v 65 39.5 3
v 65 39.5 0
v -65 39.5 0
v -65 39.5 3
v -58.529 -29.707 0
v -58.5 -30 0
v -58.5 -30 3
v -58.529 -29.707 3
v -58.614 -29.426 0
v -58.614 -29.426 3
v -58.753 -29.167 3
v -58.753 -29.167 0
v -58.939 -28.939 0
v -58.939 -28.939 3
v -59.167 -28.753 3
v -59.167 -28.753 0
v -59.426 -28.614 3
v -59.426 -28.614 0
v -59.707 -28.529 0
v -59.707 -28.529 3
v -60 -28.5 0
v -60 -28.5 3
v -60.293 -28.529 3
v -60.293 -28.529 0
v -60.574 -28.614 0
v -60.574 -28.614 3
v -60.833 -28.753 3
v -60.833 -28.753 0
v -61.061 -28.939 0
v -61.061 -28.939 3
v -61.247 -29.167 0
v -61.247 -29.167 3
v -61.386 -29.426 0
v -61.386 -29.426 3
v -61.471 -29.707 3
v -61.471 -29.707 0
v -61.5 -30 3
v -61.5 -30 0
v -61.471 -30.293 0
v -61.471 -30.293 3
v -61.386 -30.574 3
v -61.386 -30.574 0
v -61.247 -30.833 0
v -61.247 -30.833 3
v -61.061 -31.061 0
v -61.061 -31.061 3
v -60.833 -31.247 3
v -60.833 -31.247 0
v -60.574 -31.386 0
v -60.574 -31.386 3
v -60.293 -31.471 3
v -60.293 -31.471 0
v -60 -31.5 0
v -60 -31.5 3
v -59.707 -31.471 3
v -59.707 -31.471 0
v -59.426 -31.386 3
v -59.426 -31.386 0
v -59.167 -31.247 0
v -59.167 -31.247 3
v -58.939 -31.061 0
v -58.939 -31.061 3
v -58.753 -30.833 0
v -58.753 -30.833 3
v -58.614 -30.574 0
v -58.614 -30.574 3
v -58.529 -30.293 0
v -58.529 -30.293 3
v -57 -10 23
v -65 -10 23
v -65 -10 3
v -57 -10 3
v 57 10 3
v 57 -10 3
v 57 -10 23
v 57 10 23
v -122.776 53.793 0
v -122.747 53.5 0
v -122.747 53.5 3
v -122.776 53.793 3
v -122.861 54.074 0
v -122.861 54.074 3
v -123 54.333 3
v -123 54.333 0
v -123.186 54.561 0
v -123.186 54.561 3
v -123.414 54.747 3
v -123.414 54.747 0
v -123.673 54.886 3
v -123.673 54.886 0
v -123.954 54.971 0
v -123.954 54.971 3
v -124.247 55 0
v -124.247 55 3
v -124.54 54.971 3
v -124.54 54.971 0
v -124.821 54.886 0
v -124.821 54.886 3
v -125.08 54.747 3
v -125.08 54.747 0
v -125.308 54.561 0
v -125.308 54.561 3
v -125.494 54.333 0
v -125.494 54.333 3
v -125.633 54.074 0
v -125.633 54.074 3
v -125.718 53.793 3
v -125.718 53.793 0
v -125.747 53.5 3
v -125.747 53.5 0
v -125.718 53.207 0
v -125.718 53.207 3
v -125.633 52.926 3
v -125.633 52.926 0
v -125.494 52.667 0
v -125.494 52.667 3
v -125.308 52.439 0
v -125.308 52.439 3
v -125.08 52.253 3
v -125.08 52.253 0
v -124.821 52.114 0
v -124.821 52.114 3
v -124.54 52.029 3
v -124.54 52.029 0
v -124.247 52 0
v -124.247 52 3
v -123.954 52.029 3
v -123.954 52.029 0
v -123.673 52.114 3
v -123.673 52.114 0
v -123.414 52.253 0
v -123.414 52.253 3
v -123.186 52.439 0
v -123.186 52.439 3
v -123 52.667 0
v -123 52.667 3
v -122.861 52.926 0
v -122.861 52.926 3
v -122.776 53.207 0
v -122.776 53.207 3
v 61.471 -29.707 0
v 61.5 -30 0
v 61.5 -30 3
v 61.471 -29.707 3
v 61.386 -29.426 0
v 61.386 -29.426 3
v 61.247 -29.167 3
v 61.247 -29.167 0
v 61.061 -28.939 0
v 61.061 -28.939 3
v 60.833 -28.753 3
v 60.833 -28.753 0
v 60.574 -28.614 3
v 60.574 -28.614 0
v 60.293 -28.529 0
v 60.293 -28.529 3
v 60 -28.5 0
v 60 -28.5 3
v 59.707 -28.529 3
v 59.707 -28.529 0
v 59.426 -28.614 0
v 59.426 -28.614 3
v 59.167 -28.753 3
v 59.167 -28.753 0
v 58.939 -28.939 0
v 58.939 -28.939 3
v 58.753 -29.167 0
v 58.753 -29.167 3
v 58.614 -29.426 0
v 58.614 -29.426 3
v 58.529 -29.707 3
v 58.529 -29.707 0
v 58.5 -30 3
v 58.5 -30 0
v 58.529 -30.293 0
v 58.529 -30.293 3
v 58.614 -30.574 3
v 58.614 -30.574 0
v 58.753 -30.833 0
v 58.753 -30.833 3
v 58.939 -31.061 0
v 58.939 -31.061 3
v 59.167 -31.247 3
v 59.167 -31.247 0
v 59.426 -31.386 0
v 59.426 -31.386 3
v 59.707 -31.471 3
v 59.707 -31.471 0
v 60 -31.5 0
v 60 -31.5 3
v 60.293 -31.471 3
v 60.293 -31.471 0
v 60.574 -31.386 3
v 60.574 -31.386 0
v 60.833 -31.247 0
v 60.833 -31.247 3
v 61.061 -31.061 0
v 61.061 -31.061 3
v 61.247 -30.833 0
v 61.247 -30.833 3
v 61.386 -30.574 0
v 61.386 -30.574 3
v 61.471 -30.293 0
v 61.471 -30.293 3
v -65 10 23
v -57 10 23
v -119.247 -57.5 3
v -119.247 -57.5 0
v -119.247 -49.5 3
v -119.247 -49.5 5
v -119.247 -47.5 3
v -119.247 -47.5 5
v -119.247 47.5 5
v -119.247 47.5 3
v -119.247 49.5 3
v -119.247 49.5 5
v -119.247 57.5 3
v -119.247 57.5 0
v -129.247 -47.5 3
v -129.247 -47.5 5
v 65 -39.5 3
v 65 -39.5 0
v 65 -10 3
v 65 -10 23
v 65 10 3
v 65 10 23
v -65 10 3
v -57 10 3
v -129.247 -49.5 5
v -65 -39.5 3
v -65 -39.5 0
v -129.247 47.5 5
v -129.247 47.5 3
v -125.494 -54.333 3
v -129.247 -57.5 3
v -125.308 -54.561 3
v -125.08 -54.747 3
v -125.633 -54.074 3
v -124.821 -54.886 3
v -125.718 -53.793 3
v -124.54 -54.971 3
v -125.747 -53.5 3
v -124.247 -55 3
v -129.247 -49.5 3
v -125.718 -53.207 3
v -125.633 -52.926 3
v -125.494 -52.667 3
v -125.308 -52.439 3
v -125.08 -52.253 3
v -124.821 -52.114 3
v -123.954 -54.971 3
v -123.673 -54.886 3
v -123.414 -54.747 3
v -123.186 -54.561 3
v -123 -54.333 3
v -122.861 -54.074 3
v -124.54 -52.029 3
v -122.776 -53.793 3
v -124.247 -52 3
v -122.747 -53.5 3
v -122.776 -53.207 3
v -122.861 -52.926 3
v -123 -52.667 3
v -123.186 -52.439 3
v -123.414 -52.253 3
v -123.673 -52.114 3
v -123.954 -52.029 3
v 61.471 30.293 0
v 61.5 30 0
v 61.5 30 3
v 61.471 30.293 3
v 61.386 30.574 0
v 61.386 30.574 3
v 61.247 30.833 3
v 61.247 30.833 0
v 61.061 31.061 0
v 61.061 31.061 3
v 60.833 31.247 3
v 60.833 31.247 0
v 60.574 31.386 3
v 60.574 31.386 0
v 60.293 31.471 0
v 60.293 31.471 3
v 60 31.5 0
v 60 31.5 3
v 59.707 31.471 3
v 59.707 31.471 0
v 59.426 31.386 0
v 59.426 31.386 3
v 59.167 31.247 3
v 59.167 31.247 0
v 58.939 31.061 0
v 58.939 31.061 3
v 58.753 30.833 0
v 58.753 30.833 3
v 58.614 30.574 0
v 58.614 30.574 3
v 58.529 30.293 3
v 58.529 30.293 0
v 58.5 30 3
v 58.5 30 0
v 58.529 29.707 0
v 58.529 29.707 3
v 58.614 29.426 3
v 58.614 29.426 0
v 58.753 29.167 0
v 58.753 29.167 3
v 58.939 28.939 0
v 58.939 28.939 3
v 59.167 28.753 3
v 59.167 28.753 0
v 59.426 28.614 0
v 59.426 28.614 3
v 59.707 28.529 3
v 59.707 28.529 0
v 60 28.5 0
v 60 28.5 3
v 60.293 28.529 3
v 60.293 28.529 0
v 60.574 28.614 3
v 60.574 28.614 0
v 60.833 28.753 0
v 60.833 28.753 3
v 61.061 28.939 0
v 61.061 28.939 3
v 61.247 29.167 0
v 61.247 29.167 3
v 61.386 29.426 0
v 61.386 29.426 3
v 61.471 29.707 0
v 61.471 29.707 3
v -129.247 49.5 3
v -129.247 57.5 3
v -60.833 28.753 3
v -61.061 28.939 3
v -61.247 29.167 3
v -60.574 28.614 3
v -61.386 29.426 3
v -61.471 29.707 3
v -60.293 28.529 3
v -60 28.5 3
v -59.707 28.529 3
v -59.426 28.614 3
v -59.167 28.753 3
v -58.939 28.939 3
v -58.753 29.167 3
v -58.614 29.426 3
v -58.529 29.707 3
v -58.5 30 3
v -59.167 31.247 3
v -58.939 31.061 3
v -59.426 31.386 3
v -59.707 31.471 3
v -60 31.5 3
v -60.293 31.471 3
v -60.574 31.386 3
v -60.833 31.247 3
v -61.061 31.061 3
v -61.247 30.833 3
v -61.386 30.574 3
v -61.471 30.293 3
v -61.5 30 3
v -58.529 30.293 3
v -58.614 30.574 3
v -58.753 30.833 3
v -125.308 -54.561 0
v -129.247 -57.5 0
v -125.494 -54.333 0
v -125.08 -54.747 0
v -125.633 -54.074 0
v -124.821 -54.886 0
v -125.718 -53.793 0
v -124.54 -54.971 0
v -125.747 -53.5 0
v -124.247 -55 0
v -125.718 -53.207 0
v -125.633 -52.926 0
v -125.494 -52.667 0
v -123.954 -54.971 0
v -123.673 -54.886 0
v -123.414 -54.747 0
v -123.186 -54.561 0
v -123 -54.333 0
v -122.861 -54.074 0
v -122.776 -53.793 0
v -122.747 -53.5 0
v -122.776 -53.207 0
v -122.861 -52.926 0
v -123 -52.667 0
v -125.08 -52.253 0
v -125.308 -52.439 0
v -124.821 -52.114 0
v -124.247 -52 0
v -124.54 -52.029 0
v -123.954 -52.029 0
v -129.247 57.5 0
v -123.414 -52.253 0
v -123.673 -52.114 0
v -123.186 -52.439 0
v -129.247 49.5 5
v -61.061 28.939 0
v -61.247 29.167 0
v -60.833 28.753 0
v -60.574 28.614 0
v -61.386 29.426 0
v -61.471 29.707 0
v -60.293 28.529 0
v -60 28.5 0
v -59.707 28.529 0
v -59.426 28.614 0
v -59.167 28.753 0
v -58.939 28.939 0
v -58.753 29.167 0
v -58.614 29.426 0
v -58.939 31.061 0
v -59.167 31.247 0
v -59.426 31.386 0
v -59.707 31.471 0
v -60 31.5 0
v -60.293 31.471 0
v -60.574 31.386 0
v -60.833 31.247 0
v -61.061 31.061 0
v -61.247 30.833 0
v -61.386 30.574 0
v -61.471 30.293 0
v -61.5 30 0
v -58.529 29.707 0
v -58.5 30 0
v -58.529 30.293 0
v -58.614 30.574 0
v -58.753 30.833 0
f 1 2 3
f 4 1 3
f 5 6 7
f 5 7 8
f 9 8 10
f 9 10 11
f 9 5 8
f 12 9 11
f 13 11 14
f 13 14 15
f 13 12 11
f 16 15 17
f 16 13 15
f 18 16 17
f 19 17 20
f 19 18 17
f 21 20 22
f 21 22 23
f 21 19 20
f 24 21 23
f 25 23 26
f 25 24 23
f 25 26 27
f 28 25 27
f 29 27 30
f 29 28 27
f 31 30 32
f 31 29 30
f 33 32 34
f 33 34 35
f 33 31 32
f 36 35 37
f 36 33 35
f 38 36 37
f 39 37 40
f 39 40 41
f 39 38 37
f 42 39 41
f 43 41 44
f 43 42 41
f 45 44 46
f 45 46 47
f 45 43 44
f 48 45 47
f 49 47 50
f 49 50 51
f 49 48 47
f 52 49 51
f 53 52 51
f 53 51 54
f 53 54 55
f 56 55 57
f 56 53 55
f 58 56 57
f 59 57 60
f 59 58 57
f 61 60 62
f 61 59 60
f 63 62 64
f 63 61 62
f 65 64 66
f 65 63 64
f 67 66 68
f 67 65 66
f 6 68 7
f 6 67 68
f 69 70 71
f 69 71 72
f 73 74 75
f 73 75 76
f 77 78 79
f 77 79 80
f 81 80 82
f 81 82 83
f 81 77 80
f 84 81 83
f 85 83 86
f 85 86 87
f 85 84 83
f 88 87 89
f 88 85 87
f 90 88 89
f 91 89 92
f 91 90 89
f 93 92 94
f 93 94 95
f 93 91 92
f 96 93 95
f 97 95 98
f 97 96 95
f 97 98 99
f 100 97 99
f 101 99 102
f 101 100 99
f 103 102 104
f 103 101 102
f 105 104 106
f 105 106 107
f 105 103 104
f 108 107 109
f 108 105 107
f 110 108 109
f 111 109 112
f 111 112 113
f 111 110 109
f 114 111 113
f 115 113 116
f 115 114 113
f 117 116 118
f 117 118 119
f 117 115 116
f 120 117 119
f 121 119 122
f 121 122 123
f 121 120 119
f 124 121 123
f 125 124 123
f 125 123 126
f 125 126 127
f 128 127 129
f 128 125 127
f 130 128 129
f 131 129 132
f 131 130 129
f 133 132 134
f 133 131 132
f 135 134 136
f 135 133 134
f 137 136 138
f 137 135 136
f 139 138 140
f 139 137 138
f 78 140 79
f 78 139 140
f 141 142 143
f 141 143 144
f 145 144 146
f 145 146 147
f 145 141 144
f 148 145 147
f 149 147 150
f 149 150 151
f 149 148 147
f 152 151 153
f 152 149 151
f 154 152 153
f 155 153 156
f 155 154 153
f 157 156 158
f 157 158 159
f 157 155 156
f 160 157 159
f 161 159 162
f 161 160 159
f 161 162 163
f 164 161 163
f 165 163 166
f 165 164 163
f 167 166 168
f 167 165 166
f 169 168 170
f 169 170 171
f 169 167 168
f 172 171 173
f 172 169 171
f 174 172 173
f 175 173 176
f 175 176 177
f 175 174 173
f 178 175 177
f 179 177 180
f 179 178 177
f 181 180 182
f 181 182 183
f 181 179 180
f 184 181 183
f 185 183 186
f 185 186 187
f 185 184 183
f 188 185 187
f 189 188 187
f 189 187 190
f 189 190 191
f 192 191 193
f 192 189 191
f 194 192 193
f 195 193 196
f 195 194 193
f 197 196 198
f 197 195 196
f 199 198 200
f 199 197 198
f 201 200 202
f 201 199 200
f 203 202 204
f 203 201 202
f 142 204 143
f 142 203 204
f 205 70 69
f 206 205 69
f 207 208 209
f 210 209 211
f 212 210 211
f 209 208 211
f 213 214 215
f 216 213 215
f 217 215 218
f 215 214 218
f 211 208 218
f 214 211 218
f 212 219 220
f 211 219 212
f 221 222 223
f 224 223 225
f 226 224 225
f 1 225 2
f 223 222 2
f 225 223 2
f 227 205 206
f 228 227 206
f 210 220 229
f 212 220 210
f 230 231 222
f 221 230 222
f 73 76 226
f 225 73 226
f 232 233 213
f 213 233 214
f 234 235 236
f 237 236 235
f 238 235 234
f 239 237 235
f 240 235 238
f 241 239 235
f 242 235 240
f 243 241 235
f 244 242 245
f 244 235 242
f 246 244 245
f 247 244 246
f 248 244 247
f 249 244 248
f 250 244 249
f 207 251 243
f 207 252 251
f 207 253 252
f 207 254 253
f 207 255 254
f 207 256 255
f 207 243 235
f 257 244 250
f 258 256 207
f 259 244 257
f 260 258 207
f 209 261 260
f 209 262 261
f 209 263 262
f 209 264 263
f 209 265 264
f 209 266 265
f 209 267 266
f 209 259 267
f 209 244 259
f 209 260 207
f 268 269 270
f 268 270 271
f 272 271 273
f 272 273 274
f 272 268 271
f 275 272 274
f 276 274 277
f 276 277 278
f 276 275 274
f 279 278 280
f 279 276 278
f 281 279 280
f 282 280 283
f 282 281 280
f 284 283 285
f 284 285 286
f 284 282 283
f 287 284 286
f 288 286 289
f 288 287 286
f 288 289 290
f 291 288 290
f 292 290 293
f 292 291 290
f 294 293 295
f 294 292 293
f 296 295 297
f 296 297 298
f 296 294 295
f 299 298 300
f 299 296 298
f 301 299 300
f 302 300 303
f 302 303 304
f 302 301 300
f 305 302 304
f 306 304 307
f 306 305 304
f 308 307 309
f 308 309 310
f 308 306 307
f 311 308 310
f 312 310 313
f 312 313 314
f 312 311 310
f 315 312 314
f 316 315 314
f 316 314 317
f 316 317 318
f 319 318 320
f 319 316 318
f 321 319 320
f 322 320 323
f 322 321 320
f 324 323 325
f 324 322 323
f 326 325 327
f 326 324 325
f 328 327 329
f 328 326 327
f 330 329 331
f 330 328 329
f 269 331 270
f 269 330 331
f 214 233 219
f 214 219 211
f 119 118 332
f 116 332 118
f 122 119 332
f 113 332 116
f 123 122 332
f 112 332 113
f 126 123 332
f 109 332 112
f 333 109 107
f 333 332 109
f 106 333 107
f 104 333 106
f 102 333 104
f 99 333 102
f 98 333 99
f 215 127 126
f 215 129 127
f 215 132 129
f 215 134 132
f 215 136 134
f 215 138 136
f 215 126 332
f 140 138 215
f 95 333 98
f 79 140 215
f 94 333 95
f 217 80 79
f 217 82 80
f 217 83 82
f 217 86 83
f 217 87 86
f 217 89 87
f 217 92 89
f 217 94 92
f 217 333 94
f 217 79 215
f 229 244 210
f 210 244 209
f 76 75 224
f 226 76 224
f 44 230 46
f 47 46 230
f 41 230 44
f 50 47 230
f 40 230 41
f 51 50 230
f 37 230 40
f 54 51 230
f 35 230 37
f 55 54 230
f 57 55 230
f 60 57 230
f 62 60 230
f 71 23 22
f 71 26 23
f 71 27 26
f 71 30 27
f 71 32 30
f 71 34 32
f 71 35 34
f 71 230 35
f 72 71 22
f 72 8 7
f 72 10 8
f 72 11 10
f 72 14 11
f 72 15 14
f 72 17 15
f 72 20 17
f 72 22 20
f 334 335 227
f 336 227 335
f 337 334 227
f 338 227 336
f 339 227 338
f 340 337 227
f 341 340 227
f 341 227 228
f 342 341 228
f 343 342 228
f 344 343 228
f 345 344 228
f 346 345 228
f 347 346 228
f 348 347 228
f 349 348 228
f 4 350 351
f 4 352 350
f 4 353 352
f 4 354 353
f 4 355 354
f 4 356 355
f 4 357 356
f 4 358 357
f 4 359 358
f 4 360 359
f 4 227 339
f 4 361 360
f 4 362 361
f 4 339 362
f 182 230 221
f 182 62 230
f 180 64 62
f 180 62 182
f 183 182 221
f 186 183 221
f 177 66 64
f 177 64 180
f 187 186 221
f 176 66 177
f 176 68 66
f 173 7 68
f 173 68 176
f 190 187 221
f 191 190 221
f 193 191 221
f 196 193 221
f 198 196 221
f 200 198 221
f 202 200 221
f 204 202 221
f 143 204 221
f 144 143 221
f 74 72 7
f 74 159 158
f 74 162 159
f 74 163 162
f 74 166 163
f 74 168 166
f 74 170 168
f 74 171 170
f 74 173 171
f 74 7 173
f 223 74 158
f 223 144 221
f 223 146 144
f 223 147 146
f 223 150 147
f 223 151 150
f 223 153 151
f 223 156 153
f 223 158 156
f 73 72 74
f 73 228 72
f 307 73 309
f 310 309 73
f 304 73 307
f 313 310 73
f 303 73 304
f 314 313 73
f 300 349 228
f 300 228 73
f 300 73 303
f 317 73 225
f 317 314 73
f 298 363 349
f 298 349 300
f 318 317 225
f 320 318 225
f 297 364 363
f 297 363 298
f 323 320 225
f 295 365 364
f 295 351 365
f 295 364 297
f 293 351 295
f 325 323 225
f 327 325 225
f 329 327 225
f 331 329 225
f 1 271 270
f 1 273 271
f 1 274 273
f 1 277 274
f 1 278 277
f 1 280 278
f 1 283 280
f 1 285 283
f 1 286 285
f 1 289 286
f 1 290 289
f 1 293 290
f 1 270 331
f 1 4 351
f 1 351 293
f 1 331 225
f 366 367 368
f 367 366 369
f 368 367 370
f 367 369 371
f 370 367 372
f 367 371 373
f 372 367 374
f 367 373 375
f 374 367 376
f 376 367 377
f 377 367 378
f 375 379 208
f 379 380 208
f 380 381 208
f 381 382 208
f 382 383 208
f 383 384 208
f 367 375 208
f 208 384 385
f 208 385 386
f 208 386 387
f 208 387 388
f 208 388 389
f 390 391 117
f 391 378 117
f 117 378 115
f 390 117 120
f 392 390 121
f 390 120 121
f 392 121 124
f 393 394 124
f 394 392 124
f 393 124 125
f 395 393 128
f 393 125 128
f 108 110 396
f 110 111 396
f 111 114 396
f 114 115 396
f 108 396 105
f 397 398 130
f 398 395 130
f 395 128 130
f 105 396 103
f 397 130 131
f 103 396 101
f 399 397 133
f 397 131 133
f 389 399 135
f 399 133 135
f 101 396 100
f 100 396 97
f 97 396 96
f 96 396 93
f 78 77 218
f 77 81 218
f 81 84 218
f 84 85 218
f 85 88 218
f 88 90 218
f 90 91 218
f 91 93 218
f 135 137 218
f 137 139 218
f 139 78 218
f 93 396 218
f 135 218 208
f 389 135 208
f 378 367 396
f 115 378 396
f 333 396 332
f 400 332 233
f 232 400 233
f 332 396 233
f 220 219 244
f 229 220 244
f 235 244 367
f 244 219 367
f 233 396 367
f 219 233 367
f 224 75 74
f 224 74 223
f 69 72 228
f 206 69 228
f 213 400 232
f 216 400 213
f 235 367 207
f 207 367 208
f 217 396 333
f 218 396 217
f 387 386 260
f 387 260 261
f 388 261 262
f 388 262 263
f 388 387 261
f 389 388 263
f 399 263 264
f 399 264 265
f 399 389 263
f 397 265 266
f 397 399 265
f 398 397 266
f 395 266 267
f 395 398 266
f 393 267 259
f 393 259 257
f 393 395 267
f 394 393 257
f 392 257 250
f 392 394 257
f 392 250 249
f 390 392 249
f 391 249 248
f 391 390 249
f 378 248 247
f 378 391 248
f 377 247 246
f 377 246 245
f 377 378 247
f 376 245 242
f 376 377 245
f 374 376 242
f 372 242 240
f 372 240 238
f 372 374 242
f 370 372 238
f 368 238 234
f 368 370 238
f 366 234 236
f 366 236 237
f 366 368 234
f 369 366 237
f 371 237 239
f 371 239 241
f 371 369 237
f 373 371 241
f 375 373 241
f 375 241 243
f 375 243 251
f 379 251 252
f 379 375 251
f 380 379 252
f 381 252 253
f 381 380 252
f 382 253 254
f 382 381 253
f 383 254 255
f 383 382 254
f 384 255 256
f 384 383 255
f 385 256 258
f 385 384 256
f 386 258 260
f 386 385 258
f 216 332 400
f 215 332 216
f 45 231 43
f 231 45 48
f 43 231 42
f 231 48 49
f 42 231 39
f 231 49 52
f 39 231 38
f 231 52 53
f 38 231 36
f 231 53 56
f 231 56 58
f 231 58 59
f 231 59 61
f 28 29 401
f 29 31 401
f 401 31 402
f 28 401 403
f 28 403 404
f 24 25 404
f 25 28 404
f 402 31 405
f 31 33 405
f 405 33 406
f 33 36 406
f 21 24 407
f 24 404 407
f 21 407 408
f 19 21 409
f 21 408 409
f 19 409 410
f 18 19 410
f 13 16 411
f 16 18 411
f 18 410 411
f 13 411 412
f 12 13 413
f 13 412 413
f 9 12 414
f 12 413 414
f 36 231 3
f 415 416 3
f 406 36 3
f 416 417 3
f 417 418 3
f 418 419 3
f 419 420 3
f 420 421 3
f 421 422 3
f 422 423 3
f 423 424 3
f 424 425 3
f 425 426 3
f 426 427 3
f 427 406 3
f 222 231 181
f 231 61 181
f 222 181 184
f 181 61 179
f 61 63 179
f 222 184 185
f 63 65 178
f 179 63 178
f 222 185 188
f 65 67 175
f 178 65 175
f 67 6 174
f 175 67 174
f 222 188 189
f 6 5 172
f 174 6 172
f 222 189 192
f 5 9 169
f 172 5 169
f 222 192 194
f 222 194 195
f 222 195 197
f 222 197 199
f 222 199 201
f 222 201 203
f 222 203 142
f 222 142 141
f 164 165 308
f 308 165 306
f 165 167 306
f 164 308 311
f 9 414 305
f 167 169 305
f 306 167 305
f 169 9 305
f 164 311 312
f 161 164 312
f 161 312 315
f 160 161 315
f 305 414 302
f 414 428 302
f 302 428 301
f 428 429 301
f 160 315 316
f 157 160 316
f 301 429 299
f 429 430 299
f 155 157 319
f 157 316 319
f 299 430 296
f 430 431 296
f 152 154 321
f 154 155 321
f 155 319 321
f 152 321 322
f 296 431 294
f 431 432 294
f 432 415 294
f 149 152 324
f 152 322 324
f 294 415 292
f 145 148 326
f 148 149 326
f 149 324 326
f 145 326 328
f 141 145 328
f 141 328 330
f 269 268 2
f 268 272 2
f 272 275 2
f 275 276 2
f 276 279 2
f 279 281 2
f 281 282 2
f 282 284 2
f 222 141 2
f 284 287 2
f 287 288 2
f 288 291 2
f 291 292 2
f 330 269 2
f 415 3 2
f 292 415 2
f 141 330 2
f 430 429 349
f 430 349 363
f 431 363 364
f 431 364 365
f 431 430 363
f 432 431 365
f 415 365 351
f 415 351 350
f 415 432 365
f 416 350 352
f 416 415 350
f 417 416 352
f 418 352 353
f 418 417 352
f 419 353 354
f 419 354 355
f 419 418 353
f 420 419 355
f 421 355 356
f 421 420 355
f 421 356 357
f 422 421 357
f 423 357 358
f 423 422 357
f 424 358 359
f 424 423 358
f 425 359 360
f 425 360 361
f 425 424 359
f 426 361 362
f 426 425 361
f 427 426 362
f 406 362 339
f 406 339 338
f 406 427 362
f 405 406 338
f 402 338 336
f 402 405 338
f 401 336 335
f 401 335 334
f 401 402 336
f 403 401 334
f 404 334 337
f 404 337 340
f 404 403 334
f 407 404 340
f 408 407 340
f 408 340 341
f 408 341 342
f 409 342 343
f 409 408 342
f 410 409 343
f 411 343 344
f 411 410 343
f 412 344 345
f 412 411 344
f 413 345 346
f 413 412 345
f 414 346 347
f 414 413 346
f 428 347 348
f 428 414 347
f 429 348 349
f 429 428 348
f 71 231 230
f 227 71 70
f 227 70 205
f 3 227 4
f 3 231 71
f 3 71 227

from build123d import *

# Parameters (mm, degrees)
F0_W     = 110
F0_H     = 79
F0_W_2   = 10
F0_R     = 1.5
F1_DEPTH = 3
F2_W     = 8
F2_H     = 20
F3_DEPTH = 20
F4_W     = 10
F4_H     = 10
F4_R     = 1.5
F4_H_2   = 95
F5_DEPTH = 3
F6_W     = 10
F6_H     = 2
F7_DEPTH = 2


with BuildPart() as f1:
    # F0 (on Top) → F1 (new body)
    with BuildSketch(Plane.XY):
        Rectangle(F0_W, F0_H)
        with Locations((60, 0)):
            Rectangle(F0_W_2, F0_H)
        with Locations((60, -30)):
            Circle(F0_R, mode=Mode.SUBTRACT)
        with Locations((60, 30)):
            Circle(F0_R, mode=Mode.SUBTRACT)
        with Locations((-60, 0)):
            Rectangle(F0_W_2, F0_H)
        with Locations((-60, -30)):
            Circle(F0_R, mode=Mode.SUBTRACT)
        with Locations((-60, 30)):
            Circle(F0_R, mode=Mode.SUBTRACT)
    extrude(amount=F1_DEPTH)

    # F2 (on face) → F3 (join)
    with BuildSketch(Plane.XY.offset(3)):
        with Locations((-61, 0)):
            Rectangle(F2_W, F2_H)
        with Locations((61, 0)):
            Rectangle(F2_W, F2_H)
    extrude(amount=F3_DEPTH)


with BuildPart() as f5:
    # F4 (on Top) → F5 (new body)
    with BuildSketch(Plane.XY):
        with Locations((-124.247089, -52.5)):
            Rectangle(F4_W, F4_H)
        with Locations((-124.247089, -53.5)):
            Circle(F4_R, mode=Mode.SUBTRACT)
        with Locations((-124.247089, 0)):
            Rectangle(F4_W, F4_H_2)
        with Locations((-124.247089, 52.5)):
            Rectangle(F4_W, F4_H)
        with Locations((-124.247089, 53.5)):
            Circle(F4_R, mode=Mode.SUBTRACT)
    extrude(amount=F5_DEPTH)

    # F6 (on face) → F7 (join)
    with BuildSketch(Plane.XY.offset(3)):
        with Locations((-124.247089, 48.5)):
            Rectangle(F6_W, F6_H)
        with Locations((-124.247089, -48.5)):
            Rectangle(F6_W, F6_H)
    extrude(amount=F7_DEPTH)


solid = Compound([f1.part, f5.part])
